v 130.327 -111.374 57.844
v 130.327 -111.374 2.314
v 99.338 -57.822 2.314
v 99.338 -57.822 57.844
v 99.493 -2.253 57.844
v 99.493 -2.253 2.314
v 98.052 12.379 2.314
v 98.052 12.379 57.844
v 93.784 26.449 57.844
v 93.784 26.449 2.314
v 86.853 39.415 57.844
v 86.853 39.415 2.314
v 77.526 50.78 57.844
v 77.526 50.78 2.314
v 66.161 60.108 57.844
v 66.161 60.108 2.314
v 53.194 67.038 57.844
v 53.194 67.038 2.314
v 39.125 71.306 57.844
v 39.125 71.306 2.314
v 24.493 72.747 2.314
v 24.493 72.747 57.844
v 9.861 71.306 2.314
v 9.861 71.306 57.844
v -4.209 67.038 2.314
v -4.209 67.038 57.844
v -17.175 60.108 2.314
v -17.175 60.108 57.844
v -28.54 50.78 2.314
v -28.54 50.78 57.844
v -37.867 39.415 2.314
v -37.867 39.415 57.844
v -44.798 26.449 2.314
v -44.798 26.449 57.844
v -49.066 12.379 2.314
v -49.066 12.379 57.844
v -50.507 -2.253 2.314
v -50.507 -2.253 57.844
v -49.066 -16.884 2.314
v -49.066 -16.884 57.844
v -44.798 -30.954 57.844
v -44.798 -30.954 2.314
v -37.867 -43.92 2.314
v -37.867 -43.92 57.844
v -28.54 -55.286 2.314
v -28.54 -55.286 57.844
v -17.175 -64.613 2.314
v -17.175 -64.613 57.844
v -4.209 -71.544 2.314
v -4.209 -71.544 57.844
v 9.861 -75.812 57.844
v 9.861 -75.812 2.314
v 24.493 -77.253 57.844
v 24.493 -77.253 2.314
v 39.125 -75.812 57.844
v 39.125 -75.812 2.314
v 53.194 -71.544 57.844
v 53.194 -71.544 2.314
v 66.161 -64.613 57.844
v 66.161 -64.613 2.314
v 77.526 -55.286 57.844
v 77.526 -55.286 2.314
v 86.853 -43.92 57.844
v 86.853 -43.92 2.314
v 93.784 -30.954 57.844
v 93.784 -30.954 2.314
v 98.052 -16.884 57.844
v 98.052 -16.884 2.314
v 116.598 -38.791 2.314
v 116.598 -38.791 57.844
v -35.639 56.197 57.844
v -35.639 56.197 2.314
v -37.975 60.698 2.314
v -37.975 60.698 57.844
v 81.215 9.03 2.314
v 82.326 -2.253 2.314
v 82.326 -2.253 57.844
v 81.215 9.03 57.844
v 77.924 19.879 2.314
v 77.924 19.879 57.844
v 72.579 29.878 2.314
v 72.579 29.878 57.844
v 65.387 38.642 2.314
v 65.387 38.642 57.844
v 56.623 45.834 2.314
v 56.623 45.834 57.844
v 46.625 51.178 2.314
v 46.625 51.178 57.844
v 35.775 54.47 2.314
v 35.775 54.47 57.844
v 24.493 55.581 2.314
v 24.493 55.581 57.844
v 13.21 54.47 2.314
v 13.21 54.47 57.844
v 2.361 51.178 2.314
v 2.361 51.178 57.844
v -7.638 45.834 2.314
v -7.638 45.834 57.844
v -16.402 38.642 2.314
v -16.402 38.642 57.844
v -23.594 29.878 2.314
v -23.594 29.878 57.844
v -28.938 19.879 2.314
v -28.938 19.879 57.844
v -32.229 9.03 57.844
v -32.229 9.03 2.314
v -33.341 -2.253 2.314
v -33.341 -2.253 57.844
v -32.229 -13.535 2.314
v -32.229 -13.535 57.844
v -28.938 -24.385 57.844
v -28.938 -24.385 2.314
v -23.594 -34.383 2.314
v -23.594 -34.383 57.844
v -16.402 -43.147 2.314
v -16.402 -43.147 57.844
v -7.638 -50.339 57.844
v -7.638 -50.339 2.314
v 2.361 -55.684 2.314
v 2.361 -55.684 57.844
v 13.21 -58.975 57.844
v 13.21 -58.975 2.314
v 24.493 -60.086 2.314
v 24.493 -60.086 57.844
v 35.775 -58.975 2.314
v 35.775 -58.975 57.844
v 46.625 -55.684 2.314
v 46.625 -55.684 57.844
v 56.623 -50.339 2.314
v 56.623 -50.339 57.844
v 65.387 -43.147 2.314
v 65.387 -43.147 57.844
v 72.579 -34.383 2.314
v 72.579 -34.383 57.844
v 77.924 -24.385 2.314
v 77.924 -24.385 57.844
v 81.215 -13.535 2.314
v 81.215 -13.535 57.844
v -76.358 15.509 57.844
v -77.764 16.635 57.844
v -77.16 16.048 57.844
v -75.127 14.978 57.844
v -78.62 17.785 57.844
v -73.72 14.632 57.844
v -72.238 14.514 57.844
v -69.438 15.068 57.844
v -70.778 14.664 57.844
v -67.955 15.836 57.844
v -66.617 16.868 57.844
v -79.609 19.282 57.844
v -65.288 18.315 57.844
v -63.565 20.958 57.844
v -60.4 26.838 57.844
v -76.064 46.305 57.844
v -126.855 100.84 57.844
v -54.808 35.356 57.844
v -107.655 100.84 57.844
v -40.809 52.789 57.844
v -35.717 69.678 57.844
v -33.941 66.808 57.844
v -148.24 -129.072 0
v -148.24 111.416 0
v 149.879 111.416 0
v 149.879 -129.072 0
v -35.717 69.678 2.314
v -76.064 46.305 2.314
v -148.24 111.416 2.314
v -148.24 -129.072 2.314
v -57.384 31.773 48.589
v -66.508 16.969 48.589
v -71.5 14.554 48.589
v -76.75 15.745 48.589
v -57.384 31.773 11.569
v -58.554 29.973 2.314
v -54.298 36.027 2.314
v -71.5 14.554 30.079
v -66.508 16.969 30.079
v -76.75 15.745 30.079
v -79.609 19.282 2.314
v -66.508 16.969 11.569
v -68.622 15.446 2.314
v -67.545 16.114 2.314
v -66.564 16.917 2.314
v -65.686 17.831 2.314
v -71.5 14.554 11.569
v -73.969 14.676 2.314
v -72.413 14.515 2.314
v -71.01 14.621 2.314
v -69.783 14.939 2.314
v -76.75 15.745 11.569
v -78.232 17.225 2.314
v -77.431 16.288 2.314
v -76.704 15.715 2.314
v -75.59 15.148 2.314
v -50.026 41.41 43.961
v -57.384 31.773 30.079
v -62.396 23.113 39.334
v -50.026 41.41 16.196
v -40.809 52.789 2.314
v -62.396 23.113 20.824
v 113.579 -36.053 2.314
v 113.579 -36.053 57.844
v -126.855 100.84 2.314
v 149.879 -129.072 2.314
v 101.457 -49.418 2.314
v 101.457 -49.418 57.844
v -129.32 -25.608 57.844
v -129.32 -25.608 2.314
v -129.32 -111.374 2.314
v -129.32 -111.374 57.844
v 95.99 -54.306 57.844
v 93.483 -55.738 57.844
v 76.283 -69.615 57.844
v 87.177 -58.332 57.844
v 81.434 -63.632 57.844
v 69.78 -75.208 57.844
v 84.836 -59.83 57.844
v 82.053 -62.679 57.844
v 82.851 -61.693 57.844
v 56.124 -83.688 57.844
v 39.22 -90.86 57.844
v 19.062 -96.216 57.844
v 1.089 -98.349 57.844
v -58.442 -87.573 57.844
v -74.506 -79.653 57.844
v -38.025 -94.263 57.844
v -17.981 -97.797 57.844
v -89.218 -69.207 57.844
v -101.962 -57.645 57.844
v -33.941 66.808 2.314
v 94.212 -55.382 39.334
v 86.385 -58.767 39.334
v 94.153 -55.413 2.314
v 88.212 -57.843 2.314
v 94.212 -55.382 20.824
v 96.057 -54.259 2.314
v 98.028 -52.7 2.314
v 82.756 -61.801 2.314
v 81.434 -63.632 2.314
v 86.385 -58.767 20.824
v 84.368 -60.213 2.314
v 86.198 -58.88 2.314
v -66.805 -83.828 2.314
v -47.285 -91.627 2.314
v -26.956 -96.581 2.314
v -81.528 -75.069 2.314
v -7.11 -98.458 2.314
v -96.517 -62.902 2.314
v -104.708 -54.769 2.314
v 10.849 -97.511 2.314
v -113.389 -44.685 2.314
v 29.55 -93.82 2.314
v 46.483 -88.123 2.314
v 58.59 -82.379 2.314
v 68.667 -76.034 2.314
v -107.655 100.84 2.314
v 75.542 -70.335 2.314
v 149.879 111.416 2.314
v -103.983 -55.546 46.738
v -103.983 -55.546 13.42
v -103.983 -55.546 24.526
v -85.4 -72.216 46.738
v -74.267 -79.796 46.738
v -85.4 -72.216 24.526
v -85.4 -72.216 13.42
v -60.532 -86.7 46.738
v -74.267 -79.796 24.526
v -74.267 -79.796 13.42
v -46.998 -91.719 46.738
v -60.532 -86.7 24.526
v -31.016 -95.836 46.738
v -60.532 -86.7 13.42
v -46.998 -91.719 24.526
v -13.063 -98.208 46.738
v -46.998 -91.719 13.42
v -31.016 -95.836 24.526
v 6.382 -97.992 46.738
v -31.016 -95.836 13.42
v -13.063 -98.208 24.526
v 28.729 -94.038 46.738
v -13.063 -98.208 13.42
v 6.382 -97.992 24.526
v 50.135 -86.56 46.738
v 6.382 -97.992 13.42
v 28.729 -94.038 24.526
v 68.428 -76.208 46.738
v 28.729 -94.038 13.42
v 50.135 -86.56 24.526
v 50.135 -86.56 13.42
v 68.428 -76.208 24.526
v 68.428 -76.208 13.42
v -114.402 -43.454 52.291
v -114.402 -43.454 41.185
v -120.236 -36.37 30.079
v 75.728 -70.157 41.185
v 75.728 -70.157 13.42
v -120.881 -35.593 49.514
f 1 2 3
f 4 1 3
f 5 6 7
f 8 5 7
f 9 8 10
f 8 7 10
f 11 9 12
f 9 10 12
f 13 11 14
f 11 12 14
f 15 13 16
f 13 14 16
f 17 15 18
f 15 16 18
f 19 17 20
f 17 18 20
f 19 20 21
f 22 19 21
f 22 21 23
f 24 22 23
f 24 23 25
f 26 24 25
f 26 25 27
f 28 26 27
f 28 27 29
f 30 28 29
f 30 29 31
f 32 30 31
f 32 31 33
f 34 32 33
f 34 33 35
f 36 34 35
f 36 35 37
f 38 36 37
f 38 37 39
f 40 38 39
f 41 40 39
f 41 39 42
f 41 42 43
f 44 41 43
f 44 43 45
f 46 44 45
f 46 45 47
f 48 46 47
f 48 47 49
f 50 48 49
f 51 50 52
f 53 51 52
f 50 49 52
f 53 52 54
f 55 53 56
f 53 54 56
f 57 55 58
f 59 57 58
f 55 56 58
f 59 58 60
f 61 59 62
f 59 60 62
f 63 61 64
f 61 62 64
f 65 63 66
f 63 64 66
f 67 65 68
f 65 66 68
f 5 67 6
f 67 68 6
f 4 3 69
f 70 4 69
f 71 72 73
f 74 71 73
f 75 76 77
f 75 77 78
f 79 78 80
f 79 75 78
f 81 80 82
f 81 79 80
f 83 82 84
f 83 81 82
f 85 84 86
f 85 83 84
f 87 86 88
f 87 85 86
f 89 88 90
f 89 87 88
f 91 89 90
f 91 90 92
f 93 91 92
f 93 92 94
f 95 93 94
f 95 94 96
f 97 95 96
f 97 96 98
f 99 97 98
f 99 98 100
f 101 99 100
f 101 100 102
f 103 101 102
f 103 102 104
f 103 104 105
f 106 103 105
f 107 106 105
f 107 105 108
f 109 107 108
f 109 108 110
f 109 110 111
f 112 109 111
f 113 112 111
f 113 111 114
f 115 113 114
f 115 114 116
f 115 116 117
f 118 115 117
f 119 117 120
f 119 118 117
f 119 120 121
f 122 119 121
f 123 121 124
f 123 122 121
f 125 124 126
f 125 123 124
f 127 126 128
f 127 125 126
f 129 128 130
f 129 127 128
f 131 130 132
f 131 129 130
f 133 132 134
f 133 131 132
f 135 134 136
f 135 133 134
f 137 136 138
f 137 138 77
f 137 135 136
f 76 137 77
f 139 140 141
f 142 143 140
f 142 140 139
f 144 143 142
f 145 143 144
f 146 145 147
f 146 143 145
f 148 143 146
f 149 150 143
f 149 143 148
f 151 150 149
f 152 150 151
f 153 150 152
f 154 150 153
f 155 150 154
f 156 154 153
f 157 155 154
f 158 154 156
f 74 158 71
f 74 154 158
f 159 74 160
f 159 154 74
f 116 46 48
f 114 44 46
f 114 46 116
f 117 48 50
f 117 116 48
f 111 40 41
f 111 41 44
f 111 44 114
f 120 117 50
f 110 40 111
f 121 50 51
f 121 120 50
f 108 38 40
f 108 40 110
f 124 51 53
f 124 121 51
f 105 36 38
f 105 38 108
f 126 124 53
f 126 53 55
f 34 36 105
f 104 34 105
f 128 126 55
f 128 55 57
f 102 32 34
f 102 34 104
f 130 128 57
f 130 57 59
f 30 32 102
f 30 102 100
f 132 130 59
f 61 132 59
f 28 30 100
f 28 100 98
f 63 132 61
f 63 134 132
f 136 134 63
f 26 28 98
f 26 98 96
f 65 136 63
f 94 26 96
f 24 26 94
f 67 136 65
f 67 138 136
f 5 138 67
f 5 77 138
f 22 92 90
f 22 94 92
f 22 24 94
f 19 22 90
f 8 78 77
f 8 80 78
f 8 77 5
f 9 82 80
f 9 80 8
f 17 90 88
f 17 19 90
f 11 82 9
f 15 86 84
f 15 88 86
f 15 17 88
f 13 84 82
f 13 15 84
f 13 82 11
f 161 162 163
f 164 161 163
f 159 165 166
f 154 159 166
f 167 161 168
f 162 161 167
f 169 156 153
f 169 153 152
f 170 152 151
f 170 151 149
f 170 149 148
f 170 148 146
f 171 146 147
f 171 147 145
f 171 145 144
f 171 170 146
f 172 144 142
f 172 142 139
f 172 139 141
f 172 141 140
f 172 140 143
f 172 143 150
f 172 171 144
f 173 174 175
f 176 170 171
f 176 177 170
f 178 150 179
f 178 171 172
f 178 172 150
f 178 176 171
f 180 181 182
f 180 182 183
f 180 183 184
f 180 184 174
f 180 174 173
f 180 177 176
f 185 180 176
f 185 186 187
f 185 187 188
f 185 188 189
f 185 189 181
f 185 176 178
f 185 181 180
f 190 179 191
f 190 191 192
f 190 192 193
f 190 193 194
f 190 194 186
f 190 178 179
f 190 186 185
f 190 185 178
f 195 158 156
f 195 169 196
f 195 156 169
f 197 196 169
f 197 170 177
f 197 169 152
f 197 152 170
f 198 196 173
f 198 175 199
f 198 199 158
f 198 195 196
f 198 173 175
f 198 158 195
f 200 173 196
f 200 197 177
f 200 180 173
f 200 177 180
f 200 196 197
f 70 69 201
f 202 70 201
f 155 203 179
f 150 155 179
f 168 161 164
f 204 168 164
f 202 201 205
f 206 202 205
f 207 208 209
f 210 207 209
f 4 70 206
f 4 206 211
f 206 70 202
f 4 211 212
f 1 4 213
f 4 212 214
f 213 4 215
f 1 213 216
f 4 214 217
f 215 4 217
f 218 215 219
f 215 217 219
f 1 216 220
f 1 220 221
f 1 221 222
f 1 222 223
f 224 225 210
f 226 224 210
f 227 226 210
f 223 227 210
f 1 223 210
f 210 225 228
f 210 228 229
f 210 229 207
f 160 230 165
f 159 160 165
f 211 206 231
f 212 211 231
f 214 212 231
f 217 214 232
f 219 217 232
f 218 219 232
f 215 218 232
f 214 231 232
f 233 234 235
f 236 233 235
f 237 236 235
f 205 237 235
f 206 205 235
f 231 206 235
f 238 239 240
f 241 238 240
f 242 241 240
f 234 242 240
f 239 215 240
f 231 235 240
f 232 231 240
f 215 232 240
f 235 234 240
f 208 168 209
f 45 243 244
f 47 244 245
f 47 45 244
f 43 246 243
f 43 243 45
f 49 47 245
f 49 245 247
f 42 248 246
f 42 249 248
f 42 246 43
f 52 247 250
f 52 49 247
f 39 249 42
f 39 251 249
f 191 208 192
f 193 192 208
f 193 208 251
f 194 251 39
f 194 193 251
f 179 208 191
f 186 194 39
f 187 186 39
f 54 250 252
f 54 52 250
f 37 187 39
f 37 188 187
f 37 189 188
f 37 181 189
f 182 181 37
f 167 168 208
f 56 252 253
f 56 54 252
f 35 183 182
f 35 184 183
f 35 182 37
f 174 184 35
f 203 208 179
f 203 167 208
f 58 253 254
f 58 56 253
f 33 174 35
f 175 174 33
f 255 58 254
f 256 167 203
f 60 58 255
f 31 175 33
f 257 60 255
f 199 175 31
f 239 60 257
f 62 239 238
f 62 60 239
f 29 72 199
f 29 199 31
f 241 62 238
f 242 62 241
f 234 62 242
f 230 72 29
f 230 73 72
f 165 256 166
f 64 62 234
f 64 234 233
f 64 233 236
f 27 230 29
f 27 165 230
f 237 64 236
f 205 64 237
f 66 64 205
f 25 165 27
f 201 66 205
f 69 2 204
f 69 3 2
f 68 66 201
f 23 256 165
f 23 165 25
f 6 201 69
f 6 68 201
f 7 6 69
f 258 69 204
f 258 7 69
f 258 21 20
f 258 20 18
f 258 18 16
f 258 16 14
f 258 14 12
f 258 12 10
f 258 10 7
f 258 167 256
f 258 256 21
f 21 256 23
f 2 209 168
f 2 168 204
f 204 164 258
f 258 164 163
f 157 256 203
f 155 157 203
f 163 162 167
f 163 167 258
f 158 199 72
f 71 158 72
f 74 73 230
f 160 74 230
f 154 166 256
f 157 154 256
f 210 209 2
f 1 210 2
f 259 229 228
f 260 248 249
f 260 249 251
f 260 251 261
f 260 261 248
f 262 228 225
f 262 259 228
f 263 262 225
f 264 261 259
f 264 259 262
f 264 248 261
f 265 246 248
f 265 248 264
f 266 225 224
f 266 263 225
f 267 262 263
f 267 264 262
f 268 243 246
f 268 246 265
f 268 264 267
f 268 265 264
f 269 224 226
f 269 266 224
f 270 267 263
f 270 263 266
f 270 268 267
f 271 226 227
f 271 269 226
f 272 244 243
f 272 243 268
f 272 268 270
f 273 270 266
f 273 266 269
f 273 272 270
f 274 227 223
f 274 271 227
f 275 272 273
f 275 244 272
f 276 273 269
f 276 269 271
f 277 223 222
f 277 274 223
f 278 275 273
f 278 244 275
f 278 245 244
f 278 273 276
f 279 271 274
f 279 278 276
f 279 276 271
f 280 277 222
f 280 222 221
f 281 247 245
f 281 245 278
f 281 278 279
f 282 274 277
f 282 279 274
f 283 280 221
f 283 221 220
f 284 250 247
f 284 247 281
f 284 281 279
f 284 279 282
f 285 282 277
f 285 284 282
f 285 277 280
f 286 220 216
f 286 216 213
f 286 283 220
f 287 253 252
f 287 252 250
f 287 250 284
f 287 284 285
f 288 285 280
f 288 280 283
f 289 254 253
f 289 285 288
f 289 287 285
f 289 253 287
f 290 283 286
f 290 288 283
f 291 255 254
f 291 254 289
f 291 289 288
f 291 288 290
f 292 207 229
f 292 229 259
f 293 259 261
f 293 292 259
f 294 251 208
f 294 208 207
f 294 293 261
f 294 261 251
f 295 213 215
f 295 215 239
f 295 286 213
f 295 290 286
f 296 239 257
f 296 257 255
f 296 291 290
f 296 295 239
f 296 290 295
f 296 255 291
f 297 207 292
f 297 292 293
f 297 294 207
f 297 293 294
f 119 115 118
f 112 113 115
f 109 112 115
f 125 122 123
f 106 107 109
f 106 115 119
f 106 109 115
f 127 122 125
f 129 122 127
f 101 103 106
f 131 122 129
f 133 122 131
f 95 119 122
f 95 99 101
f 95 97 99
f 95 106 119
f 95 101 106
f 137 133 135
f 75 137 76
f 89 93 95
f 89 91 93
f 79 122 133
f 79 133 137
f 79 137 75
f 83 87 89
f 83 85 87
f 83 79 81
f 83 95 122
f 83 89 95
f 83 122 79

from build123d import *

# Parameters (mm, degrees)
F0_W     = 128.8466192782
F0_H     = 103.9387658238
F0_R     = 32.4149354106
F0_R_2   = 24.9955574606
F1_DEPTH = 1
F2_DEPTH = 25
F3_SCALE = 2.3137482768


with BuildPart() as f1:
    # F0 (on Top) → F1 (new body)
    with BuildSketch(Plane.XY):
        with Locations((14.2612140626, -5.0945468247)):
            Rectangle(F0_W, F0_H)
        with BuildLine():
            Line((-41.9851355255, -49.414653331), (-41.9851355255, -12.3467817903))
            add(Edge.make_bspline(
                [(-41.9851355255, -12.3467817903), (-36.3967784384, -18.8449727069), (-32.1424049152, -24.7040496659), (-22.8563463397, -32.9873221008), (-12.0101651624, -39.837428659), (16.564814538, -47.8863203718), (43.5484647751, -36.5438014269), (49.1027832031, -28.7805534899)],
                knots=[0, 0, 0, 0, 0.1844848392, 0.3316690726, 0.4896983473, 0.7323640813, 1, 1, 1, 1], degree=3))
            add(Edge.make_bspline(
                [(57.7565097543, -22.6376708612), (56.6207453111, -23.7747538402), (54.8924607702, -25.4631297698), (51.1620999135, -26.310544921), (49.4963274328, -28.0857197846), (49.1027832031, -28.7805534899)],
                knots=[0, 0, 0, 0, 0.3554545122, 0.6943021938, 1, 1, 1, 1], degree=3))
            Line((57.7565097543, -22.6376708612), (62.9957451229, -16.8610578102))
            Line((62.9957451229, -16.8610578102), (64.300657325, -18.0445786904))
            Line((64.300657325, -18.0445786904), (56.8408086757, -26.2695687958))
            Line((56.8408086757, -26.2695687958), (70.2343061566, -49.414653331))
            Line((70.2343061566, -49.414653331), (-41.9851355255, -49.414653331))
        make_face(mode=Mode.SUBTRACT)
        with BuildLine():
            Line((-32.6215874869, 42.3041246831), (-18.9677700843, 18.7341238128))
            Line((-18.9677700843, 18.7341238128), (-1.5299430816, 28.8356468081))
            Line((-1.5299430816, 28.8356468081), (-0.7622250123, 27.5954864919))
            Line((-0.7622250123, 27.5954864919), (-2.5057015009, 24.9544270337))
            Line((-2.5057015009, 24.9544270337), (-1.4959619148, 23.0094380677))
            Line((-1.4959619148, 23.0094380677), (-3.7306314334, 21.5362105519))
            add(Edge.make_bspline(
                [(-3.7306314334, 21.5362105519), (-6.5005469966, 18.0159286469), (-10.9410352174, 12.9963019479), (-13.1823487403, 8.3727682989), (-14.6379791594, 5.9356637591), (-16.901027249, 4.6935576771), (-19.530875768, 5.3695780508), (-20.0020056218, 6.3195019029), (-20.4997636371, 7.0544643041)],
                knots=[0, 0, 0, 0, 0.290363485, 0.4783981708, 0.6179320642, 0.7501008839, 0.8803191229, 1, 1, 1, 1], degree=3))
            Line((-20.4997636371, 7.0544643041), (-40.919467012, 42.3041246831))
            Line((-40.919467012, 42.3041246831), (-32.6215874869, 42.3041246831))
        make_face(mode=Mode.SUBTRACT)
        with Locations((24.4927369058, -2.2526283283)):
            Circle(F0_R, mode=Mode.SUBTRACT)
        with Locations((24.4927369058, -2.2526283283)):
            Circle(F0_R)
        with Locations((24.4927369058, -2.2526283283)):
            Circle(F0_R_2, mode=Mode.SUBTRACT)
        with Locations((24.4927369058, -2.2526283283)):
            Circle(F0_R_2)
        with BuildLine():
            Line((-1.5299430816, 28.8356468081), (-18.9677700843, 18.7341238128))
            Line((-18.9677700843, 18.7341238128), (-32.6215874869, 42.3041246831))
            Line((-32.6215874869, 42.3041246831), (-40.919467012, 42.3041246831))
            Line((-40.919467012, 42.3041246831), (-20.4997636371, 7.0544643041))
            add(Edge.make_bspline(
                [(-3.7306314334, 21.5362105519), (-6.5005469966, 18.0159286469), (-10.9410352174, 12.9963019479), (-13.1823487403, 8.3727682989), (-14.6379791594, 5.9356637591), (-16.901027249, 4.6935576771), (-19.530875768, 5.3695780508), (-20.0020056218, 6.3195019029), (-20.4997636371, 7.0544643041)],
                knots=[0, 0, 0, 0, 0.290363485, 0.4783981708, 0.6179320642, 0.7501008839, 0.8803191229, 1, 1, 1, 1], degree=3))
            Line((-3.7306314334, 21.5362105519), (-1.4959619148, 23.0094380677))
            Line((-1.4959619148, 23.0094380677), (-2.5057015009, 24.9544270337))
            Line((-2.5057015009, 24.9544270337), (-0.7622250123, 27.5954864919))
            Line((-0.7622250123, 27.5954864919), (-1.5299430816, 28.8356468081))
        make_face()
        with BuildLine():
            add(Edge.make_bspline(
                [(-41.9851355255, -12.3467817903), (-36.3967784384, -18.8449727069), (-32.1424049152, -24.7040496659), (-22.8563463397, -32.9873221008), (-12.0101651624, -39.837428659), (16.564814538, -47.8863203718), (43.5484647751, -36.5438014269), (49.1027832031, -28.7805534899)],
                knots=[0, 0, 0, 0, 0.1844848392, 0.3316690726, 0.4896983473, 0.7323640813, 1, 1, 1, 1], degree=3))
            Line((-41.9851355255, -12.3467817903), (-41.9851355255, -49.414653331))
            Line((-41.9851355255, -49.414653331), (70.2343061566, -49.414653331))
            Line((70.2343061566, -49.414653331), (56.8408086757, -26.2695687958))
            Line((56.8408086757, -26.2695687958), (64.300657325, -18.0445786904))
            Line((64.300657325, -18.0445786904), (62.9957451229, -16.8610578102))
            Line((62.9957451229, -16.8610578102), (57.7565097543, -22.6376708612))
            add(Edge.make_bspline(
                [(57.7565097543, -22.6376708612), (56.6207453111, -23.7747538402), (54.8924607702, -25.4631297698), (51.1620999135, -26.310544921), (49.4963274328, -28.0857197846), (49.1027832031, -28.7805534899)],
                knots=[0, 0, 0, 0, 0.3554545122, 0.6943021938, 1, 1, 1, 1], degree=3))
        make_face()
    extrude(amount=F1_DEPTH)

    # F0 (on Top) → F2 (join)
    with BuildSketch(Plane.XY):
        with BuildLine():
            Line((-1.5299430816, 28.8356468081), (-18.9677700843, 18.7341238128))
            Line((-18.9677700843, 18.7341238128), (-32.6215874869, 42.3041246831))
            Line((-32.6215874869, 42.3041246831), (-40.919467012, 42.3041246831))
            Line((-40.919467012, 42.3041246831), (-20.4997636371, 7.0544643041))
            add(Edge.make_bspline(
                [(-3.7306314334, 21.5362105519), (-6.5005469966, 18.0159286469), (-10.9410352174, 12.9963019479), (-13.1823487403, 8.3727682989), (-14.6379791594, 5.9356637591), (-16.901027249, 4.6935576771), (-19.530875768, 5.3695780508), (-20.0020056218, 6.3195019029), (-20.4997636371, 7.0544643041)],
                knots=[0, 0, 0, 0, 0.290363485, 0.4783981708, 0.6179320642, 0.7501008839, 0.8803191229, 1, 1, 1, 1], degree=3))
            Line((-3.7306314334, 21.5362105519), (-1.4959619148, 23.0094380677))
            Line((-1.4959619148, 23.0094380677), (-2.5057015009, 24.9544270337))
            Line((-2.5057015009, 24.9544270337), (-0.7622250123, 27.5954864919))
            Line((-0.7622250123, 27.5954864919), (-1.5299430816, 28.8356468081))
        make_face()
        with Locations((24.4927369058, -2.2526283283)):
            Circle(F0_R)
        with Locations((24.4927369058, -2.2526283283)):
            Circle(F0_R_2, mode=Mode.SUBTRACT)
        with BuildLine():
            add(Edge.make_bspline(
                [(-41.9851355255, -12.3467817903), (-36.3967784384, -18.8449727069), (-32.1424049152, -24.7040496659), (-22.8563463397, -32.9873221008), (-12.0101651624, -39.837428659), (16.564814538, -47.8863203718), (43.5484647751, -36.5438014269), (49.1027832031, -28.7805534899)],
                knots=[0, 0, 0, 0, 0.1844848392, 0.3316690726, 0.4896983473, 0.7323640813, 1, 1, 1, 1], degree=3))
            Line((-41.9851355255, -12.3467817903), (-41.9851355255, -49.414653331))
            Line((-41.9851355255, -49.414653331), (70.2343061566, -49.414653331))
            Line((70.2343061566, -49.414653331), (56.8408086757, -26.2695687958))
            Line((56.8408086757, -26.2695687958), (64.300657325, -18.0445786904))
            Line((64.300657325, -18.0445786904), (62.9957451229, -16.8610578102))
            Line((62.9957451229, -16.8610578102), (57.7565097543, -22.6376708612))
            add(Edge.make_bspline(
                [(57.7565097543, -22.6376708612), (56.6207453111, -23.7747538402), (54.8924607702, -25.4631297698), (51.1620999135, -26.310544921), (49.4963274328, -28.0857197846), (49.1027832031, -28.7805534899)],
                knots=[0, 0, 0, 0, 0.3554545122, 0.6943021938, 1, 1, 1, 1], degree=3))
        make_face()
    extrude(amount=F2_DEPTH)


with BuildPart() as f1_1:
    # F3: moved
    add(f1.part.scale(F3_SCALE).moved(Location((-32.177290905, 2.9593865846, 0))))


solid = f1_1.part
